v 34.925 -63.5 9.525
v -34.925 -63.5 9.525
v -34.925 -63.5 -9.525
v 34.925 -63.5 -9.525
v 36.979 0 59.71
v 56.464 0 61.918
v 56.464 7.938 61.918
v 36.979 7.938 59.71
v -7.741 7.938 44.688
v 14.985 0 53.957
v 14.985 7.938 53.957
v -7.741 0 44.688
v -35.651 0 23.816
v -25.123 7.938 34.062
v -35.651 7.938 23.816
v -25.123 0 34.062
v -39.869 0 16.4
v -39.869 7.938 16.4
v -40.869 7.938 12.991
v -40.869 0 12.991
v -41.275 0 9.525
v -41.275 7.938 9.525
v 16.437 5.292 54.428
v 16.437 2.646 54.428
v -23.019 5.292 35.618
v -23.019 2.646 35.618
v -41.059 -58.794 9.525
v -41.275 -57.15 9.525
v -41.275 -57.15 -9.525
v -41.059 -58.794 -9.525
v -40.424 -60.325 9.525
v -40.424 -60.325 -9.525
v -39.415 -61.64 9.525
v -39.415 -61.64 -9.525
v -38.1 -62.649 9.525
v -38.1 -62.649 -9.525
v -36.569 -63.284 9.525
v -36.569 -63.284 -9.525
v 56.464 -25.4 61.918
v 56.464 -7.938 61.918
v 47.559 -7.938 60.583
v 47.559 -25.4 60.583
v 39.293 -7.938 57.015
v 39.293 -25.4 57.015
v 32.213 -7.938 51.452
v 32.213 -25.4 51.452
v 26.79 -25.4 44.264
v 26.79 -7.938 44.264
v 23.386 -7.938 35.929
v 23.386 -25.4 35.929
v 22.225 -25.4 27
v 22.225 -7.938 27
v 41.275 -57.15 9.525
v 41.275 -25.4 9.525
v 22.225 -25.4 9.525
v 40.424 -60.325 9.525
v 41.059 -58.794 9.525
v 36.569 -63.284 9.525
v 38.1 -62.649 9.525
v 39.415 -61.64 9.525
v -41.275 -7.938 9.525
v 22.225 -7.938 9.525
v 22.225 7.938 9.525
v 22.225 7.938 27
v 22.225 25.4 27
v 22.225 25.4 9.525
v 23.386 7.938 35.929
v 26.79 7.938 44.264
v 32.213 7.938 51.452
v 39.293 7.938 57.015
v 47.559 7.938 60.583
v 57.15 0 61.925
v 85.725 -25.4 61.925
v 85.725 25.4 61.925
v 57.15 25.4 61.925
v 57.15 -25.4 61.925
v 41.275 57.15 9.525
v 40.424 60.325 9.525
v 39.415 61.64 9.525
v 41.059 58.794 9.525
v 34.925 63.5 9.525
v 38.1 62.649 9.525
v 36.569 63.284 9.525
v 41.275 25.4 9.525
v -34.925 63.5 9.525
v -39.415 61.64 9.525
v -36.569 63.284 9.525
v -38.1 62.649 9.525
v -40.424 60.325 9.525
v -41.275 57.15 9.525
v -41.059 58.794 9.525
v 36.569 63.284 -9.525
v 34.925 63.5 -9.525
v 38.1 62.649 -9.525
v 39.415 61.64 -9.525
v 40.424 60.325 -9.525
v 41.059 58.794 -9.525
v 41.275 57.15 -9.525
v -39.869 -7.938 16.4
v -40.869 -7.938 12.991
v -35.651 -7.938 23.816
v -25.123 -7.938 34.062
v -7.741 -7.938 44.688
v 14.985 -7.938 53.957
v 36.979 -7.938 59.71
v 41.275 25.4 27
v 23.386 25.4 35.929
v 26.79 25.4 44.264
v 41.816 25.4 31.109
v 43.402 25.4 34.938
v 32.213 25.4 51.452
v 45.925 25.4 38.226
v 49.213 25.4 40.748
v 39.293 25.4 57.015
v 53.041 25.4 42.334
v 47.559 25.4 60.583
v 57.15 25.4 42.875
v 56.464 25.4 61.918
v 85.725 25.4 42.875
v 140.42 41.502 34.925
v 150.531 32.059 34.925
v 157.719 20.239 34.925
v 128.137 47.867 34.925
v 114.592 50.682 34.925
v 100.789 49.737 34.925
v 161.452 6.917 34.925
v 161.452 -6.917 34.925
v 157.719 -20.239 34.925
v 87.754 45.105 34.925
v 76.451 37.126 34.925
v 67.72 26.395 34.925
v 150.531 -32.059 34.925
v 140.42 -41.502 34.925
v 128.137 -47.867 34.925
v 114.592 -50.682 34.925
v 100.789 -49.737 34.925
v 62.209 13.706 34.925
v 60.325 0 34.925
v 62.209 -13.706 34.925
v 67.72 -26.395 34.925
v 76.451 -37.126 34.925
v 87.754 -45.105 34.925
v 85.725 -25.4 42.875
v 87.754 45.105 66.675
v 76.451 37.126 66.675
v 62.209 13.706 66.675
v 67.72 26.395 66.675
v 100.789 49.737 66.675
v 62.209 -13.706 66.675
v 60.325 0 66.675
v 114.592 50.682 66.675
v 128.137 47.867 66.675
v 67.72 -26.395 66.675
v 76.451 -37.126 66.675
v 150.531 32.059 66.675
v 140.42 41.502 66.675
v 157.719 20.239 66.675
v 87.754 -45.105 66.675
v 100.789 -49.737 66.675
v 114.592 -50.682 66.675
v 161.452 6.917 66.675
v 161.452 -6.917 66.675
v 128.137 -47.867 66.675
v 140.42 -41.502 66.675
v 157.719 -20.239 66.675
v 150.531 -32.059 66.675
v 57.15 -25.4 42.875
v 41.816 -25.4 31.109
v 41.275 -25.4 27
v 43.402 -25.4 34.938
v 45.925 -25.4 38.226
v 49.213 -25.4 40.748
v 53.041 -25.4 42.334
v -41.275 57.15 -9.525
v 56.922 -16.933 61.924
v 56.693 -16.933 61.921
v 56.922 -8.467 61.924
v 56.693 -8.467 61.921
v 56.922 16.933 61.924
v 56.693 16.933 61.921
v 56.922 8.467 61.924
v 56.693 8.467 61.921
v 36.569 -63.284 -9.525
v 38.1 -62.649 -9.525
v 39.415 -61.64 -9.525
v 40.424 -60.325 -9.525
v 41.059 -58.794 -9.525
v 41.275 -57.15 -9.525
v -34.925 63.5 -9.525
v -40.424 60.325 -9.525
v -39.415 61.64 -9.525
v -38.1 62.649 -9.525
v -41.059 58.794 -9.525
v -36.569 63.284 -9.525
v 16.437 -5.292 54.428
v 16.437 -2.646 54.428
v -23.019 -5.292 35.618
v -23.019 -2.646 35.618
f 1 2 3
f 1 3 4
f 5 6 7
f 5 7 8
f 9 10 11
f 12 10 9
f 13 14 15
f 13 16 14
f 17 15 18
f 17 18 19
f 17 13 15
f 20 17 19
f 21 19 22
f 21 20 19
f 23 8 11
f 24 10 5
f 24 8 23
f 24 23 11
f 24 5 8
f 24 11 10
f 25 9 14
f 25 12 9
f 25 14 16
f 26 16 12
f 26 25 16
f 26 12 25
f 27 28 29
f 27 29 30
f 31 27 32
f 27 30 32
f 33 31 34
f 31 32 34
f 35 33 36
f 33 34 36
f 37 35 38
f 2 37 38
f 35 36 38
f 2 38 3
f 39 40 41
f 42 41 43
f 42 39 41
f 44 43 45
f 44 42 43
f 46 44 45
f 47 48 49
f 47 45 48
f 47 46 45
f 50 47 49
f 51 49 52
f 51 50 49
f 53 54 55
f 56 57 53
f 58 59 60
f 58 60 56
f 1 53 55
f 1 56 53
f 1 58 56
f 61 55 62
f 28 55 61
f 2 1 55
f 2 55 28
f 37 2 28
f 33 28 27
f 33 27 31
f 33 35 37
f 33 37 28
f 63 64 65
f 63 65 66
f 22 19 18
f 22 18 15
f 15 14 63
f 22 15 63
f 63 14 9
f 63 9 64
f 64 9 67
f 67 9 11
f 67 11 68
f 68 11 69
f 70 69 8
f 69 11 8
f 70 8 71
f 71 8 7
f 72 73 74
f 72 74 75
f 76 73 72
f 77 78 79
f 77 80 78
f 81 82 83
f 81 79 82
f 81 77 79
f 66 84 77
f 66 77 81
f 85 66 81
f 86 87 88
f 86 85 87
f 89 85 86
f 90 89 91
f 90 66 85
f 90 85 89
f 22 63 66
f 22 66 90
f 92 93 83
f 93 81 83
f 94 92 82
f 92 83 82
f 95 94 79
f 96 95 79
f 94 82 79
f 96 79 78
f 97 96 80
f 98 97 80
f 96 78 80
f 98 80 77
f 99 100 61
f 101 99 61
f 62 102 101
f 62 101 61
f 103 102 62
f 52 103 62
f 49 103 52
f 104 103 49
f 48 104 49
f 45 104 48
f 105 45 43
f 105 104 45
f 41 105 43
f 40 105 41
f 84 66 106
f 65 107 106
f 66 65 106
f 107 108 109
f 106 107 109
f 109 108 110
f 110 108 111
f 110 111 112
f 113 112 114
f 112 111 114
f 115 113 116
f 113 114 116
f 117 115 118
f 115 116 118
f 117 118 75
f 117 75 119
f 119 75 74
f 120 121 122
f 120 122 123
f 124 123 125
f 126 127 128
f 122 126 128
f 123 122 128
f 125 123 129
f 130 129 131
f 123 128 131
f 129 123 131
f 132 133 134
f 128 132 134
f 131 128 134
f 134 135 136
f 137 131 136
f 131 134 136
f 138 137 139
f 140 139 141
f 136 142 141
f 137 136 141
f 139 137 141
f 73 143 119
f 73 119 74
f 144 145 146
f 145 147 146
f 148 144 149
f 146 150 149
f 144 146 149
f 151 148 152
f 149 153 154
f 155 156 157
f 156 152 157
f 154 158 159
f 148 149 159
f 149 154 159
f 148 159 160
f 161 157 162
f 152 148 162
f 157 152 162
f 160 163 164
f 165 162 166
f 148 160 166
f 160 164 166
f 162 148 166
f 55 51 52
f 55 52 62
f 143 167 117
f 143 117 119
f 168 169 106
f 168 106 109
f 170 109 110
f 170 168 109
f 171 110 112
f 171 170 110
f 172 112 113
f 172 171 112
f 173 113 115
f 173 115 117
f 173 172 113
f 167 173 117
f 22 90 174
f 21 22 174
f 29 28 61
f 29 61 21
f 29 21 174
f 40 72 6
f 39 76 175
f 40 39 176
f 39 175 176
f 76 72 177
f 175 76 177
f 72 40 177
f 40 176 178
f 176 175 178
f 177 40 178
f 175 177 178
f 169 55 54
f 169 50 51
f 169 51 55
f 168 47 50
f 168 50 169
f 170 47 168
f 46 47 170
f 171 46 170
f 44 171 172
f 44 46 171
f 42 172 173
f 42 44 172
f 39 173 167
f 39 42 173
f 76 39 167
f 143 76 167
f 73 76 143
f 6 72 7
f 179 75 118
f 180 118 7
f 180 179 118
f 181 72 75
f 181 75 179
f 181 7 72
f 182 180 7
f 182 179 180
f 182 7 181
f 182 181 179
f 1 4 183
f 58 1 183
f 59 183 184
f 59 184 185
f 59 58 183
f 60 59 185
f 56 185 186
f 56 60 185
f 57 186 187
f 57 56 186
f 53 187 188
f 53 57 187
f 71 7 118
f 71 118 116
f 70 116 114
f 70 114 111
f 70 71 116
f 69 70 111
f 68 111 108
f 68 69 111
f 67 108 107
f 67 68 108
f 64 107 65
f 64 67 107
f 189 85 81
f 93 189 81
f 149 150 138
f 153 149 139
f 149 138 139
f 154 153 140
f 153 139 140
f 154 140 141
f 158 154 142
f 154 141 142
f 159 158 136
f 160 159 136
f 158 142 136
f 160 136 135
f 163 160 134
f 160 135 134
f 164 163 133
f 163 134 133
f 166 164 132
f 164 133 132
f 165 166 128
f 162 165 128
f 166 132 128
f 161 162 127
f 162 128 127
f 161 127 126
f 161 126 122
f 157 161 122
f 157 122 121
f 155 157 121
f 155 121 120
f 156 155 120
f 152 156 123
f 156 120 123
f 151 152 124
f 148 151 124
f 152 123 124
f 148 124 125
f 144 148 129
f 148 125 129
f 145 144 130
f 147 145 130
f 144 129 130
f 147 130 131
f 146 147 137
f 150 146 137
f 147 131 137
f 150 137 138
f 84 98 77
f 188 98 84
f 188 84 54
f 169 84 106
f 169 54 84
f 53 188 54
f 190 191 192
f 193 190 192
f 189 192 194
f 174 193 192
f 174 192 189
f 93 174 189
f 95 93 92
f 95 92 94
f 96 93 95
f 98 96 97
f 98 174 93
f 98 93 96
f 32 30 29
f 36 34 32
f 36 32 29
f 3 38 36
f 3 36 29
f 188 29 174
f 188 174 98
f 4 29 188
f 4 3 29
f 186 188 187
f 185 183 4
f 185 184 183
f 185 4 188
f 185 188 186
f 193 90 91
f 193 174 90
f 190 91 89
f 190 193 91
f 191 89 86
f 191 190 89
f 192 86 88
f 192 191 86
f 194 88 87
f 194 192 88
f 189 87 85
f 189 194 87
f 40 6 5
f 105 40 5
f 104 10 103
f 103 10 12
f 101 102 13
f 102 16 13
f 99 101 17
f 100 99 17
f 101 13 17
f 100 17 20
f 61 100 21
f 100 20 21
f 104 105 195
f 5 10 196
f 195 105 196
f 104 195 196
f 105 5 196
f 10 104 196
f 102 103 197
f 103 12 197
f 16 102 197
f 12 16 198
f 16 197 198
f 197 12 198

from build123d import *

# Parameters (mm, degrees)
F1_DEPTH = 63.5
F0_W     = 25.4
F0_H     = 19.05
F2_DEPTH = 25.4
F3_DEPTH = 7.9375
F5_R     = 6.35


with BuildPart() as f1:
    # F0 (on Front) → F1 (new body, symmetric)
    with BuildSketch(Plane.XZ):
        Polygon((41.275, -9.525), (41.275, 9.525), (22.225, 9.525), (-41.275, 9.525), (-41.275, -9.525), align=None)
    extrude(amount=F1_DEPTH, both=True)

    # F0 (on Front) → F2 (join, symmetric)
    with BuildSketch(Plane.XZ):
        with BuildLine():
            Line((22.225, 9.525), (41.275, 9.525))
            Line((41.275, 9.525), (41.275, 27.0002))
            ThreePointArc((41.275, 27.0002), (45.92468, 38.22552), (57.15, 42.8752))
            Line((57.15, 42.8752), (60.325, 42.8752))
            Line((60.325, 42.8752), (60.325, 61.9252))
            Line((60.325, 61.9252), (57.15, 61.9252))
            add(Edge.make_bspline(
                [(57.15, 61.9252), (56.922648, 61.924048), (56.693839, 61.921797), (56.463602, 61.918454)],
                knots=[0, 0, 0, 0, 0.762586, 0.762586, 0.762586, 0.762586], degree=3))
            ThreePointArc((56.463602, 61.918454), (32.212798, 51.452022), (22.225, 27.0002))
            Line((22.225, 27.0002), (22.225, 9.525))
        make_face()
        with Locations((73.025, 52.4002)):
            Rectangle(F0_W, F0_H)
    extrude(amount=F2_DEPTH, both=True)

    # F0 (on Front) → F3 (join, symmetric)
    with BuildSketch(Plane.XZ):
        with BuildLine():
            Line((-41.275, 9.525), (22.225, 9.525))
            Line((22.225, 9.525), (22.225, 27.0002))
            ThreePointArc((22.225, 27.0002), (32.212798, 51.452022), (56.463602, 61.918454))
            add(Edge.make_bspline(
                [(56.463602, 61.918454), (23.028944, 61.433027), (-40.496569, 37.915049), (-41.275, 9.525)],
                knots=[0.762586, 0.762586, 0.762586, 0.762586, 111.504536, 111.504536, 111.504536, 111.504536], degree=3))
        make_face()
    extrude(amount=F3_DEPTH, both=True)

    # F5
    f5_edges = [f1.edges().sort_by_distance(p)[0] for p in [
        (41.275, -63.5, 0),
        (-41.275, -63.5, 0),
        (-41.275, 63.5, 0),
        (41.275, 63.5, 0),
    ]]
    fillet(f5_edges, radius=F5_R)


with BuildPart() as f4:
    # F0 (on Front) → F4 (revolve)
    with BuildSketch(Plane.XZ):
        Polygon((85.725, 42.8752), (60.325, 42.8752), (60.325, 34.925), (111.125, 34.925), (111.125, 66.675), (60.325, 66.675), (60.325, 61.9252), (85.725, 61.9252), align=None)
        with Locations((73.025, 52.4002)):
            Rectangle(F0_W, F0_H)
    revolve(axis=Axis((111.125, 0, 50.8), (0, 0, 1)))


solid = Compound([f1.part, f4.part])
